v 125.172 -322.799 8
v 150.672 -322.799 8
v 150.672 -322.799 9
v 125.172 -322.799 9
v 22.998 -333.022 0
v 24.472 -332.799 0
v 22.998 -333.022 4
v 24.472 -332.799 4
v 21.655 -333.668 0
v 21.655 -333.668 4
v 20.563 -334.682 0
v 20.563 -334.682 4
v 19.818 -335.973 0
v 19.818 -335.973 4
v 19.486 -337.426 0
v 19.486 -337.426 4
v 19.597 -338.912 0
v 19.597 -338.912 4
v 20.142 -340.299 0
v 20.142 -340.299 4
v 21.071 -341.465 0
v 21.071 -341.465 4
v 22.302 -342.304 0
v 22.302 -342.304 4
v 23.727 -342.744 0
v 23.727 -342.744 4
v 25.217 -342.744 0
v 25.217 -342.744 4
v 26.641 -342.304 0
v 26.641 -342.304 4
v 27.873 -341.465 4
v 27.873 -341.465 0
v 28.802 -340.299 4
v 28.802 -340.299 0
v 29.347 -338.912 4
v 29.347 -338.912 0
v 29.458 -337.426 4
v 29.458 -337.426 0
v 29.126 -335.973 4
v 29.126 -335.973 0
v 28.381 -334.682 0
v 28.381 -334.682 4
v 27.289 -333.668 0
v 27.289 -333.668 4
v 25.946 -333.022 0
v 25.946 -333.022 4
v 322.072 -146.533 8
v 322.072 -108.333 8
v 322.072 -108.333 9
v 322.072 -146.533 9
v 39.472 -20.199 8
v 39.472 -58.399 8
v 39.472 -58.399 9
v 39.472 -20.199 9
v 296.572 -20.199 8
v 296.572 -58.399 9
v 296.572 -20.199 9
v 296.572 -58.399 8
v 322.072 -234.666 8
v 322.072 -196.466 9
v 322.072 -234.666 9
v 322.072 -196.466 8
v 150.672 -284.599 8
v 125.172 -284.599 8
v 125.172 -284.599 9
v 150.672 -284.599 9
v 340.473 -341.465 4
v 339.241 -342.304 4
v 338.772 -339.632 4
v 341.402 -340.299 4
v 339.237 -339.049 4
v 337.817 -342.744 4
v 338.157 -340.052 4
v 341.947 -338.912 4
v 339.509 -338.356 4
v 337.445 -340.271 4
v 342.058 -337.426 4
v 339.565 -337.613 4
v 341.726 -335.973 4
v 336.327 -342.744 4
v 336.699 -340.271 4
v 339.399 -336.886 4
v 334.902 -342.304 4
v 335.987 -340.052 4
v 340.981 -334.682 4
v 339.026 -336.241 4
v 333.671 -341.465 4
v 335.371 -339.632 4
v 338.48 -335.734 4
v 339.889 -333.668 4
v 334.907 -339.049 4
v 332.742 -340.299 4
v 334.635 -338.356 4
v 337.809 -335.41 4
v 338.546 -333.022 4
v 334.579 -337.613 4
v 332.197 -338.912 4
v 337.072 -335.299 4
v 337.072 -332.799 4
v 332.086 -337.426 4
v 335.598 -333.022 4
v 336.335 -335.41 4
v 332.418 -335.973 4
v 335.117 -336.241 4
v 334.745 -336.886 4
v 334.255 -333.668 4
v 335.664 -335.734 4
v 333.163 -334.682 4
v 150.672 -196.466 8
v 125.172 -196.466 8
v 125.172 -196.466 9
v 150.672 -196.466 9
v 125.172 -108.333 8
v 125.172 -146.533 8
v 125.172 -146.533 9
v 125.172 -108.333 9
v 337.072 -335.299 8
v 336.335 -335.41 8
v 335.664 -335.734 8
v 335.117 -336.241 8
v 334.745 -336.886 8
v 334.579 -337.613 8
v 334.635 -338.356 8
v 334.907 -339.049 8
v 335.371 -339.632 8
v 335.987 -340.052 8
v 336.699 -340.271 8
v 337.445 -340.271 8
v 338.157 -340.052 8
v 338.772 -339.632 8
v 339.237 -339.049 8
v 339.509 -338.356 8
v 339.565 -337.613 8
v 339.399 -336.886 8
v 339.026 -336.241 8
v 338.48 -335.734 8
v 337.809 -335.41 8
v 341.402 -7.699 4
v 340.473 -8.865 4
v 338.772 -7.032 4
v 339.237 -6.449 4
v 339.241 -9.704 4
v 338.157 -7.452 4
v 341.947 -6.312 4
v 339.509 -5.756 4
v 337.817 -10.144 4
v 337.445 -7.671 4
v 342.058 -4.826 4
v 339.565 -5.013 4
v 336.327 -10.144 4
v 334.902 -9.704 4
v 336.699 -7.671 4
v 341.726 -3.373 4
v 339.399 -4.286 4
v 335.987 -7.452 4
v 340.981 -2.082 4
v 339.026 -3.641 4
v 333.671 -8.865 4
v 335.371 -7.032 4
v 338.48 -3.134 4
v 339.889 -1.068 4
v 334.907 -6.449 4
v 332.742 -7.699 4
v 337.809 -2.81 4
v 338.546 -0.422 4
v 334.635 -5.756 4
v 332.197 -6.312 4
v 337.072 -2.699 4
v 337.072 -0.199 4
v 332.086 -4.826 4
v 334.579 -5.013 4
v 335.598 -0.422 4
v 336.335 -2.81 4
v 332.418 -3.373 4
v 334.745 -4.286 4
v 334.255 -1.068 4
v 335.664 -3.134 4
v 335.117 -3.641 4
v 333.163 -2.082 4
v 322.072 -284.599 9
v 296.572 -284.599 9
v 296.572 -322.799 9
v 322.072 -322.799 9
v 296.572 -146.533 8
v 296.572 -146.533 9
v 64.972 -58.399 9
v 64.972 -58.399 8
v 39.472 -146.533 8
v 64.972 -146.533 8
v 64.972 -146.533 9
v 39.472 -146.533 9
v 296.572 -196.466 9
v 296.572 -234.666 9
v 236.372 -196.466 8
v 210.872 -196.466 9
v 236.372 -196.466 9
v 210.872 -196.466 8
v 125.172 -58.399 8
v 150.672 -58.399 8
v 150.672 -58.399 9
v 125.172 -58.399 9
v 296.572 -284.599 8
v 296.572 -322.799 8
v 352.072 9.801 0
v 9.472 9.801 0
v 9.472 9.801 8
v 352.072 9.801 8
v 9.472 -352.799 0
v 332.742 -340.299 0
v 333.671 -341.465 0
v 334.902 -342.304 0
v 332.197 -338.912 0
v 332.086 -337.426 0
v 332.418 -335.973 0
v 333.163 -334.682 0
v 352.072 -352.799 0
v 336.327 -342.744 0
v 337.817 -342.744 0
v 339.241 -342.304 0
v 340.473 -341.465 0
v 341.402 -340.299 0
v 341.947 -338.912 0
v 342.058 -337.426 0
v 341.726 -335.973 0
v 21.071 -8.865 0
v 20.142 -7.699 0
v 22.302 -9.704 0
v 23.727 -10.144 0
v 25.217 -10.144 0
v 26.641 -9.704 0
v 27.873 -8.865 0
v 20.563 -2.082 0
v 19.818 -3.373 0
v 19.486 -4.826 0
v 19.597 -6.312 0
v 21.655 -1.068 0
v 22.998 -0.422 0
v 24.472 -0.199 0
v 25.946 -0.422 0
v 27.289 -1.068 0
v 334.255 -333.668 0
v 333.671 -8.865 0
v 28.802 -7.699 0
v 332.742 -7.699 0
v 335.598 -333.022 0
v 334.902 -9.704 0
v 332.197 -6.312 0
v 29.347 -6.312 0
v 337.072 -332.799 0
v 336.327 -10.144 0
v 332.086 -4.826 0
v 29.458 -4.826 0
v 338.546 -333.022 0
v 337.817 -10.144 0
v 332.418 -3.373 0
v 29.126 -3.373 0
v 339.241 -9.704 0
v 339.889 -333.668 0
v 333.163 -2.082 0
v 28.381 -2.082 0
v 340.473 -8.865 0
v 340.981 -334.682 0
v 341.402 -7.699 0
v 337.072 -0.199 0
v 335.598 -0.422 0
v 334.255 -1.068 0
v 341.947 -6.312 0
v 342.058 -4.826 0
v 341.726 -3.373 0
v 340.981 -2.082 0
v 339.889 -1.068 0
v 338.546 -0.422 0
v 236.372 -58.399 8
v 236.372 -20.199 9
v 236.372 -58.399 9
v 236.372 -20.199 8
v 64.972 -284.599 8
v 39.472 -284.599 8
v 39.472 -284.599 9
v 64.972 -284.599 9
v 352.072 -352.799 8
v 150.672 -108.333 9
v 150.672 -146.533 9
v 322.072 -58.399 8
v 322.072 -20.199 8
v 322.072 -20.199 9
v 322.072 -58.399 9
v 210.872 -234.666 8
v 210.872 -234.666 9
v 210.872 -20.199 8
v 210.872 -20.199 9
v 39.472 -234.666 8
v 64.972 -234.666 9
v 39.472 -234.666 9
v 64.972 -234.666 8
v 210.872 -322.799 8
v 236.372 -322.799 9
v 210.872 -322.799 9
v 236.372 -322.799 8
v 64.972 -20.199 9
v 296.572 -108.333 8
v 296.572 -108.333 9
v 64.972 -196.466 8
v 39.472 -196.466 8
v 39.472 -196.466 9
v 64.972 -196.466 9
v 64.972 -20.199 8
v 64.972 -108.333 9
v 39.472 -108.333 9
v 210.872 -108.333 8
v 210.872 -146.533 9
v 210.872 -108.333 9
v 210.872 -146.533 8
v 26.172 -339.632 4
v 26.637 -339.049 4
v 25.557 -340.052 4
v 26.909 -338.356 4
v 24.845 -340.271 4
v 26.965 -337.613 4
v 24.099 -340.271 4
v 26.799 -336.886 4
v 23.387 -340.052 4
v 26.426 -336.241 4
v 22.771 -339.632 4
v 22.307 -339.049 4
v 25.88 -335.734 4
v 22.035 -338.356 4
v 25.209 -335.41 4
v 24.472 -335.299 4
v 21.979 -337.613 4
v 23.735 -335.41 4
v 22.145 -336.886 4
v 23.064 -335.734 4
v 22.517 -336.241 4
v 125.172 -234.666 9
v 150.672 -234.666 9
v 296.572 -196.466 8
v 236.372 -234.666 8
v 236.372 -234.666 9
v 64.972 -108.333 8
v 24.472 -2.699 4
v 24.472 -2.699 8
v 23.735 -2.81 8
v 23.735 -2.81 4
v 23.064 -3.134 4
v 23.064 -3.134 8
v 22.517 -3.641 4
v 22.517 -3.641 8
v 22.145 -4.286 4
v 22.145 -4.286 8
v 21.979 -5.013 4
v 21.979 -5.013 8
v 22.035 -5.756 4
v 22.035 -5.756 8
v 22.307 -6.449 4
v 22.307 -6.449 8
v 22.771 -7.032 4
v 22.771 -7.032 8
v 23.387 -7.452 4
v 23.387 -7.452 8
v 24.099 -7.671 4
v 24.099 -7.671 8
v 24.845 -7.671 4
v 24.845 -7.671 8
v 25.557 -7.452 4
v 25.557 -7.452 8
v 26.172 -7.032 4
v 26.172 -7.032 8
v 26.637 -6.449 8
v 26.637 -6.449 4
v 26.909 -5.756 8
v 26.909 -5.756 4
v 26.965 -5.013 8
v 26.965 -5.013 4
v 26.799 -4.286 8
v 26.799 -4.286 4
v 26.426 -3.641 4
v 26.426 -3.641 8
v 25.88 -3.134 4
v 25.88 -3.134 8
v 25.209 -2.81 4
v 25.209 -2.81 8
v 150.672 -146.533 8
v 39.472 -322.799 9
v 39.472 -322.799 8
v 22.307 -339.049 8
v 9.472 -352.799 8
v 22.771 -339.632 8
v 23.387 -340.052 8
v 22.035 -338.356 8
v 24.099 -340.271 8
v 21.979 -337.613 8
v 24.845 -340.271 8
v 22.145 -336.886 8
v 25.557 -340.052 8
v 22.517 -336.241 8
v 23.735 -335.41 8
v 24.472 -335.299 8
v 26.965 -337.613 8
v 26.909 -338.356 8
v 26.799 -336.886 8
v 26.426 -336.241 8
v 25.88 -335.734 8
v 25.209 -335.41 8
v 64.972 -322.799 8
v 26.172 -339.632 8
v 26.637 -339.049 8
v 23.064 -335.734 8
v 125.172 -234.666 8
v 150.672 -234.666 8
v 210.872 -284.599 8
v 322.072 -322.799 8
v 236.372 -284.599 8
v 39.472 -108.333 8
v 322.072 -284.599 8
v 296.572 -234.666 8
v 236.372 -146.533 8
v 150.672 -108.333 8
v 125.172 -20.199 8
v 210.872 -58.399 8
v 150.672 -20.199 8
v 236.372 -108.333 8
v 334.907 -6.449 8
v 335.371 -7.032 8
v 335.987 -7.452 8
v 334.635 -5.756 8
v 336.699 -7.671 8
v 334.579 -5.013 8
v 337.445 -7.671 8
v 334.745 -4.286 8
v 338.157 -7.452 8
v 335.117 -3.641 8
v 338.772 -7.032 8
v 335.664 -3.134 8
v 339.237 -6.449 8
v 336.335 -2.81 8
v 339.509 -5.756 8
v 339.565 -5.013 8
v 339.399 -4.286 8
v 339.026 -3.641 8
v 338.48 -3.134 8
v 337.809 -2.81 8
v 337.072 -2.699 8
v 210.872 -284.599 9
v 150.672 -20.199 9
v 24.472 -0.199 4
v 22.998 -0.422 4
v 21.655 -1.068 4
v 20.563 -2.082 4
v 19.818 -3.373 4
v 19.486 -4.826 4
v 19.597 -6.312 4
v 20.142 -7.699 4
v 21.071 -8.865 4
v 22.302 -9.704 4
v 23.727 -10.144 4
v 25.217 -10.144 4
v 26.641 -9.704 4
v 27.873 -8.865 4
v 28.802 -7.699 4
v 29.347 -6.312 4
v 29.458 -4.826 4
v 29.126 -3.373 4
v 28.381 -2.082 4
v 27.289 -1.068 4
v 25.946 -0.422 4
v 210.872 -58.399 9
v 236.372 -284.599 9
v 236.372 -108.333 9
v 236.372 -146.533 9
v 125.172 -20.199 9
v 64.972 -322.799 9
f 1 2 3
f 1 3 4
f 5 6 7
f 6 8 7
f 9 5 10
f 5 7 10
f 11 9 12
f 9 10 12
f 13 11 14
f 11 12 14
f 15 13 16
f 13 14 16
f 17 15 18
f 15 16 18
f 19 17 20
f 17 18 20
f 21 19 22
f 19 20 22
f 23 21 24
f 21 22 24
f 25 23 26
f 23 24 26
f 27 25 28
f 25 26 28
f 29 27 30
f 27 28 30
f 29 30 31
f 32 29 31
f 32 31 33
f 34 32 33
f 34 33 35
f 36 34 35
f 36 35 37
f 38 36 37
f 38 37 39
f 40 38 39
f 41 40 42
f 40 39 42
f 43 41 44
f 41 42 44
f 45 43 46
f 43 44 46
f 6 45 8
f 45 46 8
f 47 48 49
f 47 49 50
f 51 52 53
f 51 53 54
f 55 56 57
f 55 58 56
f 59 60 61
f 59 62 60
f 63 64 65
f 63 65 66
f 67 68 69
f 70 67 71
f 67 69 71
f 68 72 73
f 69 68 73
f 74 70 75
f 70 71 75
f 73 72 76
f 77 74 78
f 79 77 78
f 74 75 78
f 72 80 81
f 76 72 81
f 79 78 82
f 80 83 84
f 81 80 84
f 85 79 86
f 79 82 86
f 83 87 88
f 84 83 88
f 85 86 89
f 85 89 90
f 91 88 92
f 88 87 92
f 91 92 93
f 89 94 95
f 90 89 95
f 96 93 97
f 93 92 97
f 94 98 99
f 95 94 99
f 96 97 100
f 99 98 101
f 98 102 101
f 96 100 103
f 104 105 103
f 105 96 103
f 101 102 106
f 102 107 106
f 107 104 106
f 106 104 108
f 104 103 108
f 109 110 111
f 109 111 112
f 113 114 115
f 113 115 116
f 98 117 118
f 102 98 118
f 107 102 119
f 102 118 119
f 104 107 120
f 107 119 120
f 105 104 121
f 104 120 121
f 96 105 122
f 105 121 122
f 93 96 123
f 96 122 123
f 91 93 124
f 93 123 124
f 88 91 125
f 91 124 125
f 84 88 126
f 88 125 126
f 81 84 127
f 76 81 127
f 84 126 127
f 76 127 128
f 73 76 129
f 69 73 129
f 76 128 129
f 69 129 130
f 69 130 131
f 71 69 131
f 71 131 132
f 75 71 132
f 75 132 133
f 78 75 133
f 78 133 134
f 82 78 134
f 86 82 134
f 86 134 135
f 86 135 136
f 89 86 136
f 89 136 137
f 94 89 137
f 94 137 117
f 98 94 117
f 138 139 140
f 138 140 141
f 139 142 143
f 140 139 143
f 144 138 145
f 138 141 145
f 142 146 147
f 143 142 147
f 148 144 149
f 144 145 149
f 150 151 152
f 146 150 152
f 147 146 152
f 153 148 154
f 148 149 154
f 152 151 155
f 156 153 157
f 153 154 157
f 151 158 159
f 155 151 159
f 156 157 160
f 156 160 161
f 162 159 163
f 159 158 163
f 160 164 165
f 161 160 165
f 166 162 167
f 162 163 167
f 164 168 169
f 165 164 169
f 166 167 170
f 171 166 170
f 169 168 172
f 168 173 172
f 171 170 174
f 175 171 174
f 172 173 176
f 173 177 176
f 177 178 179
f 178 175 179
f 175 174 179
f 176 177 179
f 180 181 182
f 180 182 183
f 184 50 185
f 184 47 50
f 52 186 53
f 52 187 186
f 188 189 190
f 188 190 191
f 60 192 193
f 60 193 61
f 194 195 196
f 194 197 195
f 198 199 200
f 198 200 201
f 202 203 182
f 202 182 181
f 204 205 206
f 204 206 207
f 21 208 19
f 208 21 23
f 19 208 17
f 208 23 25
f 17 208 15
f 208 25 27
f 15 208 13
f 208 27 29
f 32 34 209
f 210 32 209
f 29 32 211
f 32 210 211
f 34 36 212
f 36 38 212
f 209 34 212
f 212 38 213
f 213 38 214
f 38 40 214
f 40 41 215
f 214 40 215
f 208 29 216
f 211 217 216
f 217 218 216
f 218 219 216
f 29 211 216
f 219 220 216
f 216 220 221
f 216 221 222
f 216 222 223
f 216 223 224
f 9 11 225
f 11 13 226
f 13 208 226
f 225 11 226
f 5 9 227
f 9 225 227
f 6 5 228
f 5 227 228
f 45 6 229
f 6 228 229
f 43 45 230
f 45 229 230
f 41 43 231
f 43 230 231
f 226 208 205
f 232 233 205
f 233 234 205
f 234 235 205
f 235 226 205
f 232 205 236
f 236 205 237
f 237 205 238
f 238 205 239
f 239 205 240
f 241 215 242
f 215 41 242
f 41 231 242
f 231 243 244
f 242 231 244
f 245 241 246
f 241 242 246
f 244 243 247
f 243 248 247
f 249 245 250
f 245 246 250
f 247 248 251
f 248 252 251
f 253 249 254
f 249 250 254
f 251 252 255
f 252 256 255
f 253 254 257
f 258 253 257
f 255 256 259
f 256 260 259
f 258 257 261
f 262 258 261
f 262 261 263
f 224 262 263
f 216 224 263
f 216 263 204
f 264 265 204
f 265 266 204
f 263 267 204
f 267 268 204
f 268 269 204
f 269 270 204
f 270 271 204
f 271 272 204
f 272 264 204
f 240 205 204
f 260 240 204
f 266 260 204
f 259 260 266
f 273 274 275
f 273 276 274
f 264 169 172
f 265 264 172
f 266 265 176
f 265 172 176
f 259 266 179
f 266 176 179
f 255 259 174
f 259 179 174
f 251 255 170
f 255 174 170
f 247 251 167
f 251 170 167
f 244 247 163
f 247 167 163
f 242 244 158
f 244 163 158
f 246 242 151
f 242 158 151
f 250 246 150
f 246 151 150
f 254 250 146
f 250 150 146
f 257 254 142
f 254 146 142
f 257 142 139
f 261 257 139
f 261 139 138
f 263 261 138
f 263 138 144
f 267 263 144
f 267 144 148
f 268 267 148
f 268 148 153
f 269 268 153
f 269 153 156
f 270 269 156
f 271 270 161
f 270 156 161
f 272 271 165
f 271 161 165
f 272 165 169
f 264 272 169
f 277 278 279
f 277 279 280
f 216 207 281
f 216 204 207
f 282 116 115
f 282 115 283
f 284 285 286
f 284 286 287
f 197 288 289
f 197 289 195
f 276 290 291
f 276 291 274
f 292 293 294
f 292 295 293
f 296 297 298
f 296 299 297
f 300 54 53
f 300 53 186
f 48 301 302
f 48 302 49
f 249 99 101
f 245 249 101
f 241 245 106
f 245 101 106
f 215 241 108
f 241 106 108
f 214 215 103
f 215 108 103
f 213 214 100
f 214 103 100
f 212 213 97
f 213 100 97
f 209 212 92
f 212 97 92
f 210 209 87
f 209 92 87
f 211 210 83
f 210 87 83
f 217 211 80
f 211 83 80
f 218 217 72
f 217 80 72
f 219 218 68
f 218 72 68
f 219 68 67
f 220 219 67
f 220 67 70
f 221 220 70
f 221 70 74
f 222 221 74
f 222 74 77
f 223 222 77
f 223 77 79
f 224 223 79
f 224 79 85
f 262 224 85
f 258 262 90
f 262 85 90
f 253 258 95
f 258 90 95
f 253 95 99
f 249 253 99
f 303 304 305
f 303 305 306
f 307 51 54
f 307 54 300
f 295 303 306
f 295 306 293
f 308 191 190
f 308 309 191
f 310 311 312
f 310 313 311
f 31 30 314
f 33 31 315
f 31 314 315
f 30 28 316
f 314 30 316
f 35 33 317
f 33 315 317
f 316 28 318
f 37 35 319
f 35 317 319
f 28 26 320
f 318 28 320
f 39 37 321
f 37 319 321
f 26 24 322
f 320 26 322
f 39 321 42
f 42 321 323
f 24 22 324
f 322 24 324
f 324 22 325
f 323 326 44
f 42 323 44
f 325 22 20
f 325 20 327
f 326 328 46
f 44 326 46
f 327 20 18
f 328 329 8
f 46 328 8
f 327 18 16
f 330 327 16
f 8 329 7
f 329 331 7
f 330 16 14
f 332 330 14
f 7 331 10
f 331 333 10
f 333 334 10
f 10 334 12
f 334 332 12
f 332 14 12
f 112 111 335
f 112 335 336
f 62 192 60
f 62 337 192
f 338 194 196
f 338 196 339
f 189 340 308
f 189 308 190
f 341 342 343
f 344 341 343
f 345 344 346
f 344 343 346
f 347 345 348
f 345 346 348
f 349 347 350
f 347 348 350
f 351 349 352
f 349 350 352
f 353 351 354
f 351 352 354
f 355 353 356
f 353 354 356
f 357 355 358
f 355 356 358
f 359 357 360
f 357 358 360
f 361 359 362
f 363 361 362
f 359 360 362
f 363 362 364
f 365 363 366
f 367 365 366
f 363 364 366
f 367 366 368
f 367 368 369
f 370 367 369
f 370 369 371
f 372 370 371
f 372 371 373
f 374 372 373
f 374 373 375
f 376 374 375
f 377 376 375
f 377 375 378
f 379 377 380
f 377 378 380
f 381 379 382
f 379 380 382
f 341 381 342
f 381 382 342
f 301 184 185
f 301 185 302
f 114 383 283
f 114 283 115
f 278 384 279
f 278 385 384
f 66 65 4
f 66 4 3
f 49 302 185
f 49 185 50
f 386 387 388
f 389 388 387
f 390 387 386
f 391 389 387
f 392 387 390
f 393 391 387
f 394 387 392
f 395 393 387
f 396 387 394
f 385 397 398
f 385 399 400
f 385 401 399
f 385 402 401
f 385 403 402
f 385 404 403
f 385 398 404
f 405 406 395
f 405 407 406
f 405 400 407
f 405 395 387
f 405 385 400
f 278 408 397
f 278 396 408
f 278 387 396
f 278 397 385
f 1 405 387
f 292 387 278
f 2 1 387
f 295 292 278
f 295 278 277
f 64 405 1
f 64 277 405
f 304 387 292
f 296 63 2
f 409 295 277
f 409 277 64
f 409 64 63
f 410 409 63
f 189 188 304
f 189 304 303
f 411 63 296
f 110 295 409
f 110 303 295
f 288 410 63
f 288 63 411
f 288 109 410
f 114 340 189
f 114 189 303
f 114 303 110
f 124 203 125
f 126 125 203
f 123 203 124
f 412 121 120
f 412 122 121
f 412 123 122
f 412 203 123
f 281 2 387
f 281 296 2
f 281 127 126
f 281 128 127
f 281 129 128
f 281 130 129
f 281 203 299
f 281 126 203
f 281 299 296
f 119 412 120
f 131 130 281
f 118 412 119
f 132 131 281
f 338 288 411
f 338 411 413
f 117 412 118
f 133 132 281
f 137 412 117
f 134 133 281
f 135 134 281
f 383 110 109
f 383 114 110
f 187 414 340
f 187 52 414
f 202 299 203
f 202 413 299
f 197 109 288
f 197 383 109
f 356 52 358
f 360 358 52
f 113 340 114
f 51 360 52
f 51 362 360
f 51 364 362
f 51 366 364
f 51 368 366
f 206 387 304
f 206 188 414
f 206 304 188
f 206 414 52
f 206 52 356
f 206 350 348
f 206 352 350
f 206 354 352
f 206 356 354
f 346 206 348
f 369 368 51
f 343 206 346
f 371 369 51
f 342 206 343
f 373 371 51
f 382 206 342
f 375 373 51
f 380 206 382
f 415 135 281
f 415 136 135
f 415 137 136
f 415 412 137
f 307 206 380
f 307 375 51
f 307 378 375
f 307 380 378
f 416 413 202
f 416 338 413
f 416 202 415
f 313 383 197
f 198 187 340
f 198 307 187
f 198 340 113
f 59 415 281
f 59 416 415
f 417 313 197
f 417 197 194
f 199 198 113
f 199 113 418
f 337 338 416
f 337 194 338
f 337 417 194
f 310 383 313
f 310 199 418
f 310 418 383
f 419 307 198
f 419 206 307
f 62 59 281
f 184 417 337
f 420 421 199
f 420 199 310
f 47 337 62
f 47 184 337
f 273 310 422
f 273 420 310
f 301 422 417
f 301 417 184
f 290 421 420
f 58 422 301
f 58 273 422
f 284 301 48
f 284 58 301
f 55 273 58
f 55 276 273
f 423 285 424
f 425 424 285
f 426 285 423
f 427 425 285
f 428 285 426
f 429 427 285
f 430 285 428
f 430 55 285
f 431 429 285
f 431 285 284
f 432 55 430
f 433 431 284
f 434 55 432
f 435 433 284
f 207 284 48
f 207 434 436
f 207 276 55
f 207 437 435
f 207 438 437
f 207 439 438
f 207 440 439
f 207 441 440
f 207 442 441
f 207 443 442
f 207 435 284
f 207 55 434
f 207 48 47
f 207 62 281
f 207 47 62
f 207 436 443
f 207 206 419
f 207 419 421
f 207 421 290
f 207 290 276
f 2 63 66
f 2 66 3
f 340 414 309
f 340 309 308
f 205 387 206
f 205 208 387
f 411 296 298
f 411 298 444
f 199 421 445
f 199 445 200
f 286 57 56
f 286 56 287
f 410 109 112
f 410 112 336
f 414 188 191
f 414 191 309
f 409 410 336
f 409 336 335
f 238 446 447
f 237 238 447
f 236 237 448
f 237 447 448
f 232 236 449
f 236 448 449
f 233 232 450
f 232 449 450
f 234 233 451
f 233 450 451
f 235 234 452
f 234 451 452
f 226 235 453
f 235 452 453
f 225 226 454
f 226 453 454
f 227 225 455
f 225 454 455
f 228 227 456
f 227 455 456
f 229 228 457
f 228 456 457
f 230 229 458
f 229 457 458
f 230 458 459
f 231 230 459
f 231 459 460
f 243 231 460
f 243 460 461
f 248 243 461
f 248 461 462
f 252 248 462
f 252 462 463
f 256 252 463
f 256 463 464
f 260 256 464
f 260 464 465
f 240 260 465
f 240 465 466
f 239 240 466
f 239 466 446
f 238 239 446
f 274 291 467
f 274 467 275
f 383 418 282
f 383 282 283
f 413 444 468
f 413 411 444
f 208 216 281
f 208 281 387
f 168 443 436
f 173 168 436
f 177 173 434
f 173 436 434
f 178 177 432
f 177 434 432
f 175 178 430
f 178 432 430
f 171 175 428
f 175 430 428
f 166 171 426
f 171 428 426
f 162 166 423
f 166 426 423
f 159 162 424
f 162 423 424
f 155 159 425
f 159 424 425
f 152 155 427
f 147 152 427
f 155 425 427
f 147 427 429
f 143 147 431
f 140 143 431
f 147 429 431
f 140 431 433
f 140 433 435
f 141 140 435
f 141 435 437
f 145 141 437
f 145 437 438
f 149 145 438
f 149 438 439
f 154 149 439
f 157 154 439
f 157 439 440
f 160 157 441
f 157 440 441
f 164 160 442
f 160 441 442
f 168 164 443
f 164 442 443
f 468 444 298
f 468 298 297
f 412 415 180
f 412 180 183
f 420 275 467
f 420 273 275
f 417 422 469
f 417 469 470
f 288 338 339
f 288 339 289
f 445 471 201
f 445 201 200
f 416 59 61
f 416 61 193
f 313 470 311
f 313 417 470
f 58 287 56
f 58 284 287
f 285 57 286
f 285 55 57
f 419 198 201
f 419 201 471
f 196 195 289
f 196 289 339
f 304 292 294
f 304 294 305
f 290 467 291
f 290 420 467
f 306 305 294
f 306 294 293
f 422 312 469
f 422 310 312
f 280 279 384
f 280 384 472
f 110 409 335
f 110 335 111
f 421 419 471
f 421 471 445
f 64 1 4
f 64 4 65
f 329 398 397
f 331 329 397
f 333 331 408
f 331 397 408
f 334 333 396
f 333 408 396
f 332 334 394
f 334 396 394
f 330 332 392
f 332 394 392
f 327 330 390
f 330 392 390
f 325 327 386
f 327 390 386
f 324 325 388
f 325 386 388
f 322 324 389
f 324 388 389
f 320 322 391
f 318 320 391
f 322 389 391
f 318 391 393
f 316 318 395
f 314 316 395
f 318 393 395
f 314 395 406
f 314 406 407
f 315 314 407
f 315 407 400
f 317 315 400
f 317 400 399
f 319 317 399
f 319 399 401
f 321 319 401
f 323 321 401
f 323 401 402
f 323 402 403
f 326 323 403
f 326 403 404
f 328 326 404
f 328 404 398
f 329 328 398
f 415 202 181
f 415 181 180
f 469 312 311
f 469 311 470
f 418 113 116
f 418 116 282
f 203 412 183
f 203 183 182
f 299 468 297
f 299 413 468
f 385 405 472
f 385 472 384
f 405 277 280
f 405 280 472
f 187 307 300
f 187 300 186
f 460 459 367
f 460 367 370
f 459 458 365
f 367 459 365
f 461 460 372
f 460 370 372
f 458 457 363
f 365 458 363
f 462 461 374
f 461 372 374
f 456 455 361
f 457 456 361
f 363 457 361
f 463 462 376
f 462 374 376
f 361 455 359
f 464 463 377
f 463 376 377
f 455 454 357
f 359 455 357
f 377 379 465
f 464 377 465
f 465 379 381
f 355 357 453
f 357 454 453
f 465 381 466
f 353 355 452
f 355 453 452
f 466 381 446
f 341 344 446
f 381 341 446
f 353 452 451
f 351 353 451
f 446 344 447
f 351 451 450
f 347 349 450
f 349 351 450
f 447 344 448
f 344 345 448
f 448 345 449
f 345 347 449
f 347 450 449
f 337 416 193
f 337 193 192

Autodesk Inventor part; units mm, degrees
ref_plane "YZ Plane" through (0, 0, 0) normal (1, 0, 0) x (0, 1, 0)
ref_plane "XZ Plane" through (0, 0, 0) normal (0, 1, 0) x (-1, 0, 0)
ref_plane "XY Plane" through (0, 0, 0) normal (0, 0, 1) x (1, 0, 0)
sketch "Szkic1" plane through (0, 0, 0) normal (0, 0, 1) x (1, 0, 0)
  line L0 (9.4719, 9.8006) -> (352.0719, 9.8006)
  line L1 (352.0719, 9.8006) -> (352.0719, -352.7994)
  line L2 (352.0719, -352.7994) -> (9.4719, -352.7994)
  line L3 (9.4719, -352.7994) -> (9.4719, 9.8006)
  point P0 (0, 0)
  point P1 (24.4719, -337.7994)
  point P2 (337.0719, -337.7994)
  point P3 (24.4719, -5.1994)
  point P4 (337.0719, -5.1994)
  dimension "d0" = 342.6
  dimension "d1" = 362.6
  dimension "d4" = 15
  dimension "d5" = 15
  dimension "d6" = 15
  dimension "d7" = 15
  dimension "d8" = 15
  dimension "d9" = 15
  dimension "d10" = 15
  dimension "d11" = 15
  dimension "d19" = 312.6
  dimension "d20" = 332.6
extrude "Wyciągnięcie proste1" add sketch "Szkic1" along normal blind 8
hole "Otwór1" at (24.4719, -337.7994, 0) at (337.0719, -337.7994, 0) at (24.4719, -5.1994, 0) at (337.0719, -5.1994, 0) direction (0, 0, 1) diameter 5 end through all counterbore diameter 10 counterbore depth 4
sketch "Szkic2" plane through (0, 0, 8) normal (0, 0, 1) x (1, 0, 0)
  circle A0 centre (24.4719, -5.1994) radius 2.5 projected
  circle A1 centre (24.4719, -337.7994) radius 2.5 projected
  circle A2 centre (337.0719, -337.7994) radius 2.5 projected
  circle A3 centre (337.0719, -5.1994) radius 2.5 projected
  line L0 (352.0719, 9.8006) -> (9.4719, 9.8006) projected
  line L1 (9.4719, 9.8006) -> (9.4719, -352.7994) projected
  line L2 (9.4719, -352.7994) -> (352.0719, -352.7994) projected
  line L3 (352.0719, -352.7994) -> (352.0719, 9.8006) projected
  line L4 (39.4719, -20.1994) -> (64.9719, -20.1994)
  line L5 (64.9719, -20.1994) -> (64.9719, -58.3994)
  line L6 (64.9719, -58.3994) -> (39.4719, -58.3994)
  line L7 (39.4719, -58.3994) -> (39.4719, -20.1994)
  line L8 (125.1719, -20.1994) -> (150.6719, -20.1994)
  line L9 (150.6719, -20.1994) -> (150.6719, -58.3994)
  line L10 (150.6719, -58.3994) -> (125.1719, -58.3994)
  line L11 (125.1719, -58.3994) -> (125.1719, -20.1994)
  line L12 (210.8719, -20.1994) -> (236.3719, -20.1994)
  line L13 (236.3719, -20.1994) -> (236.3719, -58.3994)
  line L14 (236.3719, -58.3994) -> (210.8719, -58.3994)
  line L15 (210.8719, -58.3994) -> (210.8719, -20.1994)
  line L16 (296.5719, -20.1994) -> (322.0719, -20.1994)
  line L17 (322.0719, -20.1994) -> (322.0719, -58.3994)
  line L18 (322.0719, -58.3994) -> (296.5719, -58.3994)
  line L19 (296.5719, -58.3994) -> (296.5719, -20.1994)
  line L20 (39.4719, -108.3327) -> (64.9719, -108.3327)
  line L21 (64.9719, -108.3327) -> (64.9719, -146.5327)
  line L22 (64.9719, -146.5327) -> (39.4719, -146.5327)
  line L23 (39.4719, -146.5327) -> (39.4719, -108.3327)
  line L24 (125.1719, -108.3327) -> (150.6719, -108.3327)
  line L25 (150.6719, -108.3327) -> (150.6719, -146.5327)
  line L26 (150.6719, -146.5327) -> (125.1719, -146.5327)
  line L27 (125.1719, -146.5327) -> (125.1719, -108.3327)
  line L28 (210.8719, -108.3327) -> (236.3719, -108.3327)
  line L29 (236.3719, -108.3327) -> (236.3719, -146.5327)
  line L30 (236.3719, -146.5327) -> (210.8719, -146.5327)
  line L31 (210.8719, -146.5327) -> (210.8719, -108.3327)
  line L32 (296.5719, -108.3327) -> (322.0719, -108.3327)
  line L33 (322.0719, -108.3327) -> (322.0719, -146.5327)
  line L34 (322.0719, -146.5327) -> (296.5719, -146.5327)
  line L35 (296.5719, -146.5327) -> (296.5719, -108.3327)
  line L36 (39.4719, -196.4661) -> (64.9719, -196.4661)
  line L37 (64.9719, -196.4661) -> (64.9719, -234.6661)
  line L38 (64.9719, -234.6661) -> (39.4719, -234.6661)
  line L39 (39.4719, -234.6661) -> (39.4719, -196.4661)
  line L40 (125.1719, -196.4661) -> (150.6719, -196.4661)
  line L41 (150.6719, -196.4661) -> (150.6719, -234.6661)
  line L42 (150.6719, -234.6661) -> (125.1719, -234.6661)
  line L43 (125.1719, -234.6661) -> (125.1719, -196.4661)
  line L44 (210.8719, -196.4661) -> (236.3719, -196.4661)
  line L45 (236.3719, -196.4661) -> (236.3719, -234.6661)
  line L46 (236.3719, -234.6661) -> (210.8719, -234.6661)
  line L47 (210.8719, -234.6661) -> (210.8719, -196.4661)
  line L48 (296.5719, -196.4661) -> (322.0719, -196.4661)
  line L49 (322.0719, -196.4661) -> (322.0719, -234.6661)
  line L50 (322.0719, -234.6661) -> (296.5719, -234.6661)
  line L51 (296.5719, -234.6661) -> (296.5719, -196.4661)
  line L52 (39.4719, -284.5994) -> (64.9719, -284.5994)
  line L53 (64.9719, -284.5994) -> (64.9719, -322.7994)
  line L54 (64.9719, -322.7994) -> (39.4719, -322.7994)
  line L55 (39.4719, -322.7994) -> (39.4719, -284.5994)
  line L56 (125.1719, -284.5994) -> (150.6719, -284.5994)
  line L57 (150.6719, -284.5994) -> (150.6719, -322.7994)
  line L58 (150.6719, -322.7994) -> (125.1719, -322.7994)
  line L59 (125.1719, -322.7994) -> (125.1719, -284.5994)
  line L60 (210.8719, -284.5994) -> (236.3719, -284.5994)
  line L61 (236.3719, -284.5994) -> (236.3719, -322.7994)
  line L62 (236.3719, -322.7994) -> (210.8719, -322.7994)
  line L63 (210.8719, -322.7994) -> (210.8719, -284.5994)
  line L64 (296.5719, -284.5994) -> (322.0719, -284.5994)
  line L65 (322.0719, -284.5994) -> (322.0719, -322.7994)
  line L66 (322.0719, -322.7994) -> (296.5719, -322.7994)
  line L67 (296.5719, -322.7994) -> (296.5719, -284.5994)
  point P0 (0, 0)
  dimension "d55" = 362.6
  dimension "d56" = 342.6
  dimension "d57" = 30
  dimension "d58" = 30
  dimension "d61" = 85.7
  dimension "d64" = 88.1333
  dimension "d69" = 25.5
  dimension "d70" = 38.2
extrude "Wyciągnięcie proste2" add sketch "Szkic2" along normal blind 1 contours L4 L5 L6 L7 | L8 L9 L10 L11 | L12 L13 L14 L15 | L16 L17 L18 L19 | L20 L21 L22 L23 | L24 L25 L26 L27 | L28 L29 L30 L31 | L32 L33 L34 L35 | L36 L37 L38 L39 | L40 L41 L42 L43 | L44 L45 L46 L47 | L48 L49 L50 L51 | L52 L53 L54 L55 | L56 L57 L58 L59 | L60 L61 L62 L63 | L64 L65 L66 L67
equation "\"d5\" = d4"
equation "\"d6\" = d4"
equation "\"d7\" = d4"
equation "\"d8\" = d4"
equation "\"d9\" = d4"
equation "\"d10\" = d4"
equation "\"d11\" = d4"
equation "\"d61\" = -0.666667 * d58 + 0.333333 * d56 - 0.333333 * d69"
equation "\"d64\" = -0.666667 * d57 + 0.333333 * d55 - 0.333333 * d70"
properties part number "CNCM_ALU_8mm_Thick_Heatbed_Plate"
